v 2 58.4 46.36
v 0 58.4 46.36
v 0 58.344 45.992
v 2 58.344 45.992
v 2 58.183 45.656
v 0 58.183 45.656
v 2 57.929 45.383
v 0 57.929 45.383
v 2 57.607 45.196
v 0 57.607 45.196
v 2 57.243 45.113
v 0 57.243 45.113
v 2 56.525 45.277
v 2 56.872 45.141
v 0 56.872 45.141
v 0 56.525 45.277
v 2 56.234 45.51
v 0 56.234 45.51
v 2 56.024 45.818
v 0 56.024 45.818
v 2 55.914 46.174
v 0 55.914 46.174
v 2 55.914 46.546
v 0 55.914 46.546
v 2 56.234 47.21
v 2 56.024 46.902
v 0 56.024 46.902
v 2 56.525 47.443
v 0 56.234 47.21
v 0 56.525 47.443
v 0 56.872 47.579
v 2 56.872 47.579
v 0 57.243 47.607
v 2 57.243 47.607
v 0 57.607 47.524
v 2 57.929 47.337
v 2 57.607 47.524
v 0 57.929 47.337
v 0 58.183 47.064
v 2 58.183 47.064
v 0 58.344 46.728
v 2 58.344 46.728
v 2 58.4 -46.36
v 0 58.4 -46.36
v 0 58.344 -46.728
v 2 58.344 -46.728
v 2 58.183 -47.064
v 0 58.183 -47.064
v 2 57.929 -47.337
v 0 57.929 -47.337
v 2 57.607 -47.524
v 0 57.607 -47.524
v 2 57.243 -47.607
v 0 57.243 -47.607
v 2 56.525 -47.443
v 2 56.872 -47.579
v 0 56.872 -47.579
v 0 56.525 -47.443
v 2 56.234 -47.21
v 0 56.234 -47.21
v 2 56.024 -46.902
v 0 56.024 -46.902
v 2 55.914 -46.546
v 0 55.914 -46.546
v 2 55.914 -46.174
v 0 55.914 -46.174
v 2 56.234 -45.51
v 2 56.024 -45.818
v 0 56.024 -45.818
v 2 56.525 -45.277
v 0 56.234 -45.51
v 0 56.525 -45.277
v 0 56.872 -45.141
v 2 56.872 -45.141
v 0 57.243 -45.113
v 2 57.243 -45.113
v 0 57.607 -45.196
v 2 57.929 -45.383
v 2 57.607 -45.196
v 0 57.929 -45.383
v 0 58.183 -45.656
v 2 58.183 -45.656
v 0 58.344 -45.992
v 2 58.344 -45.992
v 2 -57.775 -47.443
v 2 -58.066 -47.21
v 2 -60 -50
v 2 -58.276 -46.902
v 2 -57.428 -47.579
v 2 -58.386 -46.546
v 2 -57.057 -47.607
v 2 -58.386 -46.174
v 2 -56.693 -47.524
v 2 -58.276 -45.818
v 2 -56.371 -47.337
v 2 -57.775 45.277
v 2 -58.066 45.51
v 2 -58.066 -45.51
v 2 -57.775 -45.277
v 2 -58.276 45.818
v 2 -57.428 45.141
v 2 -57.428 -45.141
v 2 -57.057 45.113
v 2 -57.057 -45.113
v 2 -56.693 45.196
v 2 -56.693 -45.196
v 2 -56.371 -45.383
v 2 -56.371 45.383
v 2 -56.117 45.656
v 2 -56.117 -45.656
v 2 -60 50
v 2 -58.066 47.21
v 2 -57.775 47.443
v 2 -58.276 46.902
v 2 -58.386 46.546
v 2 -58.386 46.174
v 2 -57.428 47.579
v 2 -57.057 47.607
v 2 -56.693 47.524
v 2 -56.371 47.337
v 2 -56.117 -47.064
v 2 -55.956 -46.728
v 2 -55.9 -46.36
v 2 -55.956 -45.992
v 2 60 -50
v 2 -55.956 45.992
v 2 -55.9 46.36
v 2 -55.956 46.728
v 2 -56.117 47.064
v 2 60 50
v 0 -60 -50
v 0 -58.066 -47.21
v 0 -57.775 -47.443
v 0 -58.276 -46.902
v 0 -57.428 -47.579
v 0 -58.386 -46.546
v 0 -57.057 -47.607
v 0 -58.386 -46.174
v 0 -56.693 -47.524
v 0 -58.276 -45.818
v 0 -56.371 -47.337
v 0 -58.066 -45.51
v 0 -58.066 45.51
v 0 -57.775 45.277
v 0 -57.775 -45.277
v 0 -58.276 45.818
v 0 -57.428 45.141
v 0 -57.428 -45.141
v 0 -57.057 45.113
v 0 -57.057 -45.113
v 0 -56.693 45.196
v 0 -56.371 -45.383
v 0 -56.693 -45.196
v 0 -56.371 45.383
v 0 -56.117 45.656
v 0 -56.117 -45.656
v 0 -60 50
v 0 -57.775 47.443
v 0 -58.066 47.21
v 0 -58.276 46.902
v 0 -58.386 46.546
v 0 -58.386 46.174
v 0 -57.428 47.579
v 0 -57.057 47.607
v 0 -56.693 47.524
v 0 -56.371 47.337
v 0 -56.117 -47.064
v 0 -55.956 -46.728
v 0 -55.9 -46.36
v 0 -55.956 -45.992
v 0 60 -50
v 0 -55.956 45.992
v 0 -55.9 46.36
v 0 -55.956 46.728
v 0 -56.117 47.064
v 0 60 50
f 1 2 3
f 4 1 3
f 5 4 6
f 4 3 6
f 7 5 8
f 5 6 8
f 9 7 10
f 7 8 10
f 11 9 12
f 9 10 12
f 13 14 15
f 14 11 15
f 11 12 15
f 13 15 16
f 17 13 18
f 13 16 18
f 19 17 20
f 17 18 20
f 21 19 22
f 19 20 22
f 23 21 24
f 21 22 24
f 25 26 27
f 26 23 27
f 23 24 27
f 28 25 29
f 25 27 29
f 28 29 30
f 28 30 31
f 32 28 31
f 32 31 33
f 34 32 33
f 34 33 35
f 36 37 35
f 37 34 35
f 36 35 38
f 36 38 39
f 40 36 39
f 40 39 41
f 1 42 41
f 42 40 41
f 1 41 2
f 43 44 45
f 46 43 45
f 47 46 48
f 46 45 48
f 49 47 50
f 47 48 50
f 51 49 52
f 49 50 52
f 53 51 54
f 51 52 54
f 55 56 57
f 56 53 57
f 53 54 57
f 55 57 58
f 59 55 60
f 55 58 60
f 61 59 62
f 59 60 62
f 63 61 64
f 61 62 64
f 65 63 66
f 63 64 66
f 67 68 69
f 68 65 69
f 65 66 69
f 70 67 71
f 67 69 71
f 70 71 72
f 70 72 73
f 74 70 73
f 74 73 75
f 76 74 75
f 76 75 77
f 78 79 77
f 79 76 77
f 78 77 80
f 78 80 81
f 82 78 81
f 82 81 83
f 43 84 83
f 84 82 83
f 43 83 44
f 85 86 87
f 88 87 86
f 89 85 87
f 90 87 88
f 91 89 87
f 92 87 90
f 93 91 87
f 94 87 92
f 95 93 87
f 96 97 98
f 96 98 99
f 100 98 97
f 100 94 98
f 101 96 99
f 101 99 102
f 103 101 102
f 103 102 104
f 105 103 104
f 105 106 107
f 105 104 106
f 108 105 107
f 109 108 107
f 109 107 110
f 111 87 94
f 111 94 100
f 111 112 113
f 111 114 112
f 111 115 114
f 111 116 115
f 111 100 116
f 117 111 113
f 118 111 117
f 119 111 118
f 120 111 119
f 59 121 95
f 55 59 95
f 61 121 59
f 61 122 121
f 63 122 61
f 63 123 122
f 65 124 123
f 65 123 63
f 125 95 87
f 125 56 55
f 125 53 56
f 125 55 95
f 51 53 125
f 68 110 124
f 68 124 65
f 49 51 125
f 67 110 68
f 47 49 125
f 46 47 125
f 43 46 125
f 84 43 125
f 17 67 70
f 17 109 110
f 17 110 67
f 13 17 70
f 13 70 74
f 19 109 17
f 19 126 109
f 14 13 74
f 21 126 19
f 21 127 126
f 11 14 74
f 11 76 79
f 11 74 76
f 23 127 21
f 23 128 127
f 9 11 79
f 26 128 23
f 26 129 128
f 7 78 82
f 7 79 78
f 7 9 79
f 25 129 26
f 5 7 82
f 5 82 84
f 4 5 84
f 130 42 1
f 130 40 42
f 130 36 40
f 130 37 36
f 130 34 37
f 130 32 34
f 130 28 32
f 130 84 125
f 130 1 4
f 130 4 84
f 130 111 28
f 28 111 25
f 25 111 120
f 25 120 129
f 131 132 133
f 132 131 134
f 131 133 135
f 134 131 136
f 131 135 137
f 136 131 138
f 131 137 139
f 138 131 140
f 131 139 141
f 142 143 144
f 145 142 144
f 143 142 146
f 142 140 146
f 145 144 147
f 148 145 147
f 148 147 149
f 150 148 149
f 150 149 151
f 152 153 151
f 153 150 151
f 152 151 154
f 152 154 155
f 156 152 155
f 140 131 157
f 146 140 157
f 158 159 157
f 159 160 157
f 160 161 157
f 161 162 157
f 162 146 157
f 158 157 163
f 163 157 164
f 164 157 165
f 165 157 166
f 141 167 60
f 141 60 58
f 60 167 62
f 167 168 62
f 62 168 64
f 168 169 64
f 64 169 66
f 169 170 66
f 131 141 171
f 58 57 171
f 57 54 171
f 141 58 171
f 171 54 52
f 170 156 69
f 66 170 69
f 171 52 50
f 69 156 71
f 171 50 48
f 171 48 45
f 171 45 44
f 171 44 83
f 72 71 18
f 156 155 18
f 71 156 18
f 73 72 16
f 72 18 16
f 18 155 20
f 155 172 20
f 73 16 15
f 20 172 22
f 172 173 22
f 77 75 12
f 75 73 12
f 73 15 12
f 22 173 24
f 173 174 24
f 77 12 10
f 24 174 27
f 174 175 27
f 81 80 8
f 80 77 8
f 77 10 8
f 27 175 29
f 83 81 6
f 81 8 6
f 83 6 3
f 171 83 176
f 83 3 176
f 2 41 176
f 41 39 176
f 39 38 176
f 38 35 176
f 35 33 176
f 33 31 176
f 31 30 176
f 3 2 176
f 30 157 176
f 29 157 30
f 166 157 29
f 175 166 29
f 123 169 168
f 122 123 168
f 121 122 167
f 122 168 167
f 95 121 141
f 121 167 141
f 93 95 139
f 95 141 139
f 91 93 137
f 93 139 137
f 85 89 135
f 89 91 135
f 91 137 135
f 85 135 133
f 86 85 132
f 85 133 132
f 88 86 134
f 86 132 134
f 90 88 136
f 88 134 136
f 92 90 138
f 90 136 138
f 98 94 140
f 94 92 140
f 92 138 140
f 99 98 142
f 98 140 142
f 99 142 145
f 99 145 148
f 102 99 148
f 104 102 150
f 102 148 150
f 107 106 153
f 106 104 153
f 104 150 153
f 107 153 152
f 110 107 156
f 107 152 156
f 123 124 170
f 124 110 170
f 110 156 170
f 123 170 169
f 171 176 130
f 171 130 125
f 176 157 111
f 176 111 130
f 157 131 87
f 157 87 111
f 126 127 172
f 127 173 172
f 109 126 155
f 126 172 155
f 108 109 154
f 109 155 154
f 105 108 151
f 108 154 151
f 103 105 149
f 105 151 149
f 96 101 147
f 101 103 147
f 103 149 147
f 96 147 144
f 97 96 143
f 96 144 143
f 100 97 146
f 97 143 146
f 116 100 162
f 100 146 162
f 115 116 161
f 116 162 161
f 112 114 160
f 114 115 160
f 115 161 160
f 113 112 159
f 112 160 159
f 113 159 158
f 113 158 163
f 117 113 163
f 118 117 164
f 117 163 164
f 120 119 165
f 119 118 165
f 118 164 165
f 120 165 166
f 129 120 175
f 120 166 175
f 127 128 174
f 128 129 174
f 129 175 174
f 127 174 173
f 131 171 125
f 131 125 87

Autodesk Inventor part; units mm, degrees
ref_plane "YZ Plane" through (0, 0, 0) normal (1, 0, 0) x (0, 1, 0)
ref_plane "XZ Plane" through (0, 0, 0) normal (0, 1, 0) x (-1, 0, 0)
ref_plane "XY Plane" through (0, 0, 0) normal (0, 0, 1) x (1, 0, 0)
sketch "Skizze1" plane through (0, 0, 0) normal (1, 0, 0) x (0, 1, 0)
  line L0 (-60, 50) -> (60, 50)
  line L1 (60, 50) -> (60, -50)
  line L2 (60, -50) -> (-60, -50)
  line L3 (-60, -50) -> (-60, 50)
  line L4 (0, 37.4988) -> (0, -37.4988) construction
  line L5 (-78.3748, 0) -> (89.6252, 0) construction
  line L6 (-57.15, 46.36) -> (57.15, 46.36) construction
  line L7 (57.15, 46.36) -> (57.15, -46.36) construction
  line L8 (57.15, -46.36) -> (-57.15, -46.36) construction
  line L9 (-57.15, -46.36) -> (-57.15, 46.36) construction
  circle A0 centre (-57.15, 46.36) radius 1.25
  circle A1 centre (57.15, 46.36) radius 1.25
  circle A2 centre (-57.15, -46.36) radius 1.25
  circle A3 centre (57.15, -46.36) radius 1.25
  line L10 (-60, 50) -> (60.1722, 49.7926) construction
  line L11 (60.1722, 49.7926) -> (60, -50) construction
  line L12 (60, -50) -> (-60.1722, -49.7926) construction
  line L13 (-60.1722, -49.7926) -> (-60, 50) construction
  point P0 (0, 0)
  point P1 (0, 0)
  point P2 (0, 0)
  dimension "d0" = 120
  dimension "d1" = 100
  dimension "d4" = 2.5
  dimension "d5" = 114.3
  dimension "d6" = 92.72
extrude "Extrusion1" add sketch "Skizze1" along normal blind 2
properties part number "MotorController"
